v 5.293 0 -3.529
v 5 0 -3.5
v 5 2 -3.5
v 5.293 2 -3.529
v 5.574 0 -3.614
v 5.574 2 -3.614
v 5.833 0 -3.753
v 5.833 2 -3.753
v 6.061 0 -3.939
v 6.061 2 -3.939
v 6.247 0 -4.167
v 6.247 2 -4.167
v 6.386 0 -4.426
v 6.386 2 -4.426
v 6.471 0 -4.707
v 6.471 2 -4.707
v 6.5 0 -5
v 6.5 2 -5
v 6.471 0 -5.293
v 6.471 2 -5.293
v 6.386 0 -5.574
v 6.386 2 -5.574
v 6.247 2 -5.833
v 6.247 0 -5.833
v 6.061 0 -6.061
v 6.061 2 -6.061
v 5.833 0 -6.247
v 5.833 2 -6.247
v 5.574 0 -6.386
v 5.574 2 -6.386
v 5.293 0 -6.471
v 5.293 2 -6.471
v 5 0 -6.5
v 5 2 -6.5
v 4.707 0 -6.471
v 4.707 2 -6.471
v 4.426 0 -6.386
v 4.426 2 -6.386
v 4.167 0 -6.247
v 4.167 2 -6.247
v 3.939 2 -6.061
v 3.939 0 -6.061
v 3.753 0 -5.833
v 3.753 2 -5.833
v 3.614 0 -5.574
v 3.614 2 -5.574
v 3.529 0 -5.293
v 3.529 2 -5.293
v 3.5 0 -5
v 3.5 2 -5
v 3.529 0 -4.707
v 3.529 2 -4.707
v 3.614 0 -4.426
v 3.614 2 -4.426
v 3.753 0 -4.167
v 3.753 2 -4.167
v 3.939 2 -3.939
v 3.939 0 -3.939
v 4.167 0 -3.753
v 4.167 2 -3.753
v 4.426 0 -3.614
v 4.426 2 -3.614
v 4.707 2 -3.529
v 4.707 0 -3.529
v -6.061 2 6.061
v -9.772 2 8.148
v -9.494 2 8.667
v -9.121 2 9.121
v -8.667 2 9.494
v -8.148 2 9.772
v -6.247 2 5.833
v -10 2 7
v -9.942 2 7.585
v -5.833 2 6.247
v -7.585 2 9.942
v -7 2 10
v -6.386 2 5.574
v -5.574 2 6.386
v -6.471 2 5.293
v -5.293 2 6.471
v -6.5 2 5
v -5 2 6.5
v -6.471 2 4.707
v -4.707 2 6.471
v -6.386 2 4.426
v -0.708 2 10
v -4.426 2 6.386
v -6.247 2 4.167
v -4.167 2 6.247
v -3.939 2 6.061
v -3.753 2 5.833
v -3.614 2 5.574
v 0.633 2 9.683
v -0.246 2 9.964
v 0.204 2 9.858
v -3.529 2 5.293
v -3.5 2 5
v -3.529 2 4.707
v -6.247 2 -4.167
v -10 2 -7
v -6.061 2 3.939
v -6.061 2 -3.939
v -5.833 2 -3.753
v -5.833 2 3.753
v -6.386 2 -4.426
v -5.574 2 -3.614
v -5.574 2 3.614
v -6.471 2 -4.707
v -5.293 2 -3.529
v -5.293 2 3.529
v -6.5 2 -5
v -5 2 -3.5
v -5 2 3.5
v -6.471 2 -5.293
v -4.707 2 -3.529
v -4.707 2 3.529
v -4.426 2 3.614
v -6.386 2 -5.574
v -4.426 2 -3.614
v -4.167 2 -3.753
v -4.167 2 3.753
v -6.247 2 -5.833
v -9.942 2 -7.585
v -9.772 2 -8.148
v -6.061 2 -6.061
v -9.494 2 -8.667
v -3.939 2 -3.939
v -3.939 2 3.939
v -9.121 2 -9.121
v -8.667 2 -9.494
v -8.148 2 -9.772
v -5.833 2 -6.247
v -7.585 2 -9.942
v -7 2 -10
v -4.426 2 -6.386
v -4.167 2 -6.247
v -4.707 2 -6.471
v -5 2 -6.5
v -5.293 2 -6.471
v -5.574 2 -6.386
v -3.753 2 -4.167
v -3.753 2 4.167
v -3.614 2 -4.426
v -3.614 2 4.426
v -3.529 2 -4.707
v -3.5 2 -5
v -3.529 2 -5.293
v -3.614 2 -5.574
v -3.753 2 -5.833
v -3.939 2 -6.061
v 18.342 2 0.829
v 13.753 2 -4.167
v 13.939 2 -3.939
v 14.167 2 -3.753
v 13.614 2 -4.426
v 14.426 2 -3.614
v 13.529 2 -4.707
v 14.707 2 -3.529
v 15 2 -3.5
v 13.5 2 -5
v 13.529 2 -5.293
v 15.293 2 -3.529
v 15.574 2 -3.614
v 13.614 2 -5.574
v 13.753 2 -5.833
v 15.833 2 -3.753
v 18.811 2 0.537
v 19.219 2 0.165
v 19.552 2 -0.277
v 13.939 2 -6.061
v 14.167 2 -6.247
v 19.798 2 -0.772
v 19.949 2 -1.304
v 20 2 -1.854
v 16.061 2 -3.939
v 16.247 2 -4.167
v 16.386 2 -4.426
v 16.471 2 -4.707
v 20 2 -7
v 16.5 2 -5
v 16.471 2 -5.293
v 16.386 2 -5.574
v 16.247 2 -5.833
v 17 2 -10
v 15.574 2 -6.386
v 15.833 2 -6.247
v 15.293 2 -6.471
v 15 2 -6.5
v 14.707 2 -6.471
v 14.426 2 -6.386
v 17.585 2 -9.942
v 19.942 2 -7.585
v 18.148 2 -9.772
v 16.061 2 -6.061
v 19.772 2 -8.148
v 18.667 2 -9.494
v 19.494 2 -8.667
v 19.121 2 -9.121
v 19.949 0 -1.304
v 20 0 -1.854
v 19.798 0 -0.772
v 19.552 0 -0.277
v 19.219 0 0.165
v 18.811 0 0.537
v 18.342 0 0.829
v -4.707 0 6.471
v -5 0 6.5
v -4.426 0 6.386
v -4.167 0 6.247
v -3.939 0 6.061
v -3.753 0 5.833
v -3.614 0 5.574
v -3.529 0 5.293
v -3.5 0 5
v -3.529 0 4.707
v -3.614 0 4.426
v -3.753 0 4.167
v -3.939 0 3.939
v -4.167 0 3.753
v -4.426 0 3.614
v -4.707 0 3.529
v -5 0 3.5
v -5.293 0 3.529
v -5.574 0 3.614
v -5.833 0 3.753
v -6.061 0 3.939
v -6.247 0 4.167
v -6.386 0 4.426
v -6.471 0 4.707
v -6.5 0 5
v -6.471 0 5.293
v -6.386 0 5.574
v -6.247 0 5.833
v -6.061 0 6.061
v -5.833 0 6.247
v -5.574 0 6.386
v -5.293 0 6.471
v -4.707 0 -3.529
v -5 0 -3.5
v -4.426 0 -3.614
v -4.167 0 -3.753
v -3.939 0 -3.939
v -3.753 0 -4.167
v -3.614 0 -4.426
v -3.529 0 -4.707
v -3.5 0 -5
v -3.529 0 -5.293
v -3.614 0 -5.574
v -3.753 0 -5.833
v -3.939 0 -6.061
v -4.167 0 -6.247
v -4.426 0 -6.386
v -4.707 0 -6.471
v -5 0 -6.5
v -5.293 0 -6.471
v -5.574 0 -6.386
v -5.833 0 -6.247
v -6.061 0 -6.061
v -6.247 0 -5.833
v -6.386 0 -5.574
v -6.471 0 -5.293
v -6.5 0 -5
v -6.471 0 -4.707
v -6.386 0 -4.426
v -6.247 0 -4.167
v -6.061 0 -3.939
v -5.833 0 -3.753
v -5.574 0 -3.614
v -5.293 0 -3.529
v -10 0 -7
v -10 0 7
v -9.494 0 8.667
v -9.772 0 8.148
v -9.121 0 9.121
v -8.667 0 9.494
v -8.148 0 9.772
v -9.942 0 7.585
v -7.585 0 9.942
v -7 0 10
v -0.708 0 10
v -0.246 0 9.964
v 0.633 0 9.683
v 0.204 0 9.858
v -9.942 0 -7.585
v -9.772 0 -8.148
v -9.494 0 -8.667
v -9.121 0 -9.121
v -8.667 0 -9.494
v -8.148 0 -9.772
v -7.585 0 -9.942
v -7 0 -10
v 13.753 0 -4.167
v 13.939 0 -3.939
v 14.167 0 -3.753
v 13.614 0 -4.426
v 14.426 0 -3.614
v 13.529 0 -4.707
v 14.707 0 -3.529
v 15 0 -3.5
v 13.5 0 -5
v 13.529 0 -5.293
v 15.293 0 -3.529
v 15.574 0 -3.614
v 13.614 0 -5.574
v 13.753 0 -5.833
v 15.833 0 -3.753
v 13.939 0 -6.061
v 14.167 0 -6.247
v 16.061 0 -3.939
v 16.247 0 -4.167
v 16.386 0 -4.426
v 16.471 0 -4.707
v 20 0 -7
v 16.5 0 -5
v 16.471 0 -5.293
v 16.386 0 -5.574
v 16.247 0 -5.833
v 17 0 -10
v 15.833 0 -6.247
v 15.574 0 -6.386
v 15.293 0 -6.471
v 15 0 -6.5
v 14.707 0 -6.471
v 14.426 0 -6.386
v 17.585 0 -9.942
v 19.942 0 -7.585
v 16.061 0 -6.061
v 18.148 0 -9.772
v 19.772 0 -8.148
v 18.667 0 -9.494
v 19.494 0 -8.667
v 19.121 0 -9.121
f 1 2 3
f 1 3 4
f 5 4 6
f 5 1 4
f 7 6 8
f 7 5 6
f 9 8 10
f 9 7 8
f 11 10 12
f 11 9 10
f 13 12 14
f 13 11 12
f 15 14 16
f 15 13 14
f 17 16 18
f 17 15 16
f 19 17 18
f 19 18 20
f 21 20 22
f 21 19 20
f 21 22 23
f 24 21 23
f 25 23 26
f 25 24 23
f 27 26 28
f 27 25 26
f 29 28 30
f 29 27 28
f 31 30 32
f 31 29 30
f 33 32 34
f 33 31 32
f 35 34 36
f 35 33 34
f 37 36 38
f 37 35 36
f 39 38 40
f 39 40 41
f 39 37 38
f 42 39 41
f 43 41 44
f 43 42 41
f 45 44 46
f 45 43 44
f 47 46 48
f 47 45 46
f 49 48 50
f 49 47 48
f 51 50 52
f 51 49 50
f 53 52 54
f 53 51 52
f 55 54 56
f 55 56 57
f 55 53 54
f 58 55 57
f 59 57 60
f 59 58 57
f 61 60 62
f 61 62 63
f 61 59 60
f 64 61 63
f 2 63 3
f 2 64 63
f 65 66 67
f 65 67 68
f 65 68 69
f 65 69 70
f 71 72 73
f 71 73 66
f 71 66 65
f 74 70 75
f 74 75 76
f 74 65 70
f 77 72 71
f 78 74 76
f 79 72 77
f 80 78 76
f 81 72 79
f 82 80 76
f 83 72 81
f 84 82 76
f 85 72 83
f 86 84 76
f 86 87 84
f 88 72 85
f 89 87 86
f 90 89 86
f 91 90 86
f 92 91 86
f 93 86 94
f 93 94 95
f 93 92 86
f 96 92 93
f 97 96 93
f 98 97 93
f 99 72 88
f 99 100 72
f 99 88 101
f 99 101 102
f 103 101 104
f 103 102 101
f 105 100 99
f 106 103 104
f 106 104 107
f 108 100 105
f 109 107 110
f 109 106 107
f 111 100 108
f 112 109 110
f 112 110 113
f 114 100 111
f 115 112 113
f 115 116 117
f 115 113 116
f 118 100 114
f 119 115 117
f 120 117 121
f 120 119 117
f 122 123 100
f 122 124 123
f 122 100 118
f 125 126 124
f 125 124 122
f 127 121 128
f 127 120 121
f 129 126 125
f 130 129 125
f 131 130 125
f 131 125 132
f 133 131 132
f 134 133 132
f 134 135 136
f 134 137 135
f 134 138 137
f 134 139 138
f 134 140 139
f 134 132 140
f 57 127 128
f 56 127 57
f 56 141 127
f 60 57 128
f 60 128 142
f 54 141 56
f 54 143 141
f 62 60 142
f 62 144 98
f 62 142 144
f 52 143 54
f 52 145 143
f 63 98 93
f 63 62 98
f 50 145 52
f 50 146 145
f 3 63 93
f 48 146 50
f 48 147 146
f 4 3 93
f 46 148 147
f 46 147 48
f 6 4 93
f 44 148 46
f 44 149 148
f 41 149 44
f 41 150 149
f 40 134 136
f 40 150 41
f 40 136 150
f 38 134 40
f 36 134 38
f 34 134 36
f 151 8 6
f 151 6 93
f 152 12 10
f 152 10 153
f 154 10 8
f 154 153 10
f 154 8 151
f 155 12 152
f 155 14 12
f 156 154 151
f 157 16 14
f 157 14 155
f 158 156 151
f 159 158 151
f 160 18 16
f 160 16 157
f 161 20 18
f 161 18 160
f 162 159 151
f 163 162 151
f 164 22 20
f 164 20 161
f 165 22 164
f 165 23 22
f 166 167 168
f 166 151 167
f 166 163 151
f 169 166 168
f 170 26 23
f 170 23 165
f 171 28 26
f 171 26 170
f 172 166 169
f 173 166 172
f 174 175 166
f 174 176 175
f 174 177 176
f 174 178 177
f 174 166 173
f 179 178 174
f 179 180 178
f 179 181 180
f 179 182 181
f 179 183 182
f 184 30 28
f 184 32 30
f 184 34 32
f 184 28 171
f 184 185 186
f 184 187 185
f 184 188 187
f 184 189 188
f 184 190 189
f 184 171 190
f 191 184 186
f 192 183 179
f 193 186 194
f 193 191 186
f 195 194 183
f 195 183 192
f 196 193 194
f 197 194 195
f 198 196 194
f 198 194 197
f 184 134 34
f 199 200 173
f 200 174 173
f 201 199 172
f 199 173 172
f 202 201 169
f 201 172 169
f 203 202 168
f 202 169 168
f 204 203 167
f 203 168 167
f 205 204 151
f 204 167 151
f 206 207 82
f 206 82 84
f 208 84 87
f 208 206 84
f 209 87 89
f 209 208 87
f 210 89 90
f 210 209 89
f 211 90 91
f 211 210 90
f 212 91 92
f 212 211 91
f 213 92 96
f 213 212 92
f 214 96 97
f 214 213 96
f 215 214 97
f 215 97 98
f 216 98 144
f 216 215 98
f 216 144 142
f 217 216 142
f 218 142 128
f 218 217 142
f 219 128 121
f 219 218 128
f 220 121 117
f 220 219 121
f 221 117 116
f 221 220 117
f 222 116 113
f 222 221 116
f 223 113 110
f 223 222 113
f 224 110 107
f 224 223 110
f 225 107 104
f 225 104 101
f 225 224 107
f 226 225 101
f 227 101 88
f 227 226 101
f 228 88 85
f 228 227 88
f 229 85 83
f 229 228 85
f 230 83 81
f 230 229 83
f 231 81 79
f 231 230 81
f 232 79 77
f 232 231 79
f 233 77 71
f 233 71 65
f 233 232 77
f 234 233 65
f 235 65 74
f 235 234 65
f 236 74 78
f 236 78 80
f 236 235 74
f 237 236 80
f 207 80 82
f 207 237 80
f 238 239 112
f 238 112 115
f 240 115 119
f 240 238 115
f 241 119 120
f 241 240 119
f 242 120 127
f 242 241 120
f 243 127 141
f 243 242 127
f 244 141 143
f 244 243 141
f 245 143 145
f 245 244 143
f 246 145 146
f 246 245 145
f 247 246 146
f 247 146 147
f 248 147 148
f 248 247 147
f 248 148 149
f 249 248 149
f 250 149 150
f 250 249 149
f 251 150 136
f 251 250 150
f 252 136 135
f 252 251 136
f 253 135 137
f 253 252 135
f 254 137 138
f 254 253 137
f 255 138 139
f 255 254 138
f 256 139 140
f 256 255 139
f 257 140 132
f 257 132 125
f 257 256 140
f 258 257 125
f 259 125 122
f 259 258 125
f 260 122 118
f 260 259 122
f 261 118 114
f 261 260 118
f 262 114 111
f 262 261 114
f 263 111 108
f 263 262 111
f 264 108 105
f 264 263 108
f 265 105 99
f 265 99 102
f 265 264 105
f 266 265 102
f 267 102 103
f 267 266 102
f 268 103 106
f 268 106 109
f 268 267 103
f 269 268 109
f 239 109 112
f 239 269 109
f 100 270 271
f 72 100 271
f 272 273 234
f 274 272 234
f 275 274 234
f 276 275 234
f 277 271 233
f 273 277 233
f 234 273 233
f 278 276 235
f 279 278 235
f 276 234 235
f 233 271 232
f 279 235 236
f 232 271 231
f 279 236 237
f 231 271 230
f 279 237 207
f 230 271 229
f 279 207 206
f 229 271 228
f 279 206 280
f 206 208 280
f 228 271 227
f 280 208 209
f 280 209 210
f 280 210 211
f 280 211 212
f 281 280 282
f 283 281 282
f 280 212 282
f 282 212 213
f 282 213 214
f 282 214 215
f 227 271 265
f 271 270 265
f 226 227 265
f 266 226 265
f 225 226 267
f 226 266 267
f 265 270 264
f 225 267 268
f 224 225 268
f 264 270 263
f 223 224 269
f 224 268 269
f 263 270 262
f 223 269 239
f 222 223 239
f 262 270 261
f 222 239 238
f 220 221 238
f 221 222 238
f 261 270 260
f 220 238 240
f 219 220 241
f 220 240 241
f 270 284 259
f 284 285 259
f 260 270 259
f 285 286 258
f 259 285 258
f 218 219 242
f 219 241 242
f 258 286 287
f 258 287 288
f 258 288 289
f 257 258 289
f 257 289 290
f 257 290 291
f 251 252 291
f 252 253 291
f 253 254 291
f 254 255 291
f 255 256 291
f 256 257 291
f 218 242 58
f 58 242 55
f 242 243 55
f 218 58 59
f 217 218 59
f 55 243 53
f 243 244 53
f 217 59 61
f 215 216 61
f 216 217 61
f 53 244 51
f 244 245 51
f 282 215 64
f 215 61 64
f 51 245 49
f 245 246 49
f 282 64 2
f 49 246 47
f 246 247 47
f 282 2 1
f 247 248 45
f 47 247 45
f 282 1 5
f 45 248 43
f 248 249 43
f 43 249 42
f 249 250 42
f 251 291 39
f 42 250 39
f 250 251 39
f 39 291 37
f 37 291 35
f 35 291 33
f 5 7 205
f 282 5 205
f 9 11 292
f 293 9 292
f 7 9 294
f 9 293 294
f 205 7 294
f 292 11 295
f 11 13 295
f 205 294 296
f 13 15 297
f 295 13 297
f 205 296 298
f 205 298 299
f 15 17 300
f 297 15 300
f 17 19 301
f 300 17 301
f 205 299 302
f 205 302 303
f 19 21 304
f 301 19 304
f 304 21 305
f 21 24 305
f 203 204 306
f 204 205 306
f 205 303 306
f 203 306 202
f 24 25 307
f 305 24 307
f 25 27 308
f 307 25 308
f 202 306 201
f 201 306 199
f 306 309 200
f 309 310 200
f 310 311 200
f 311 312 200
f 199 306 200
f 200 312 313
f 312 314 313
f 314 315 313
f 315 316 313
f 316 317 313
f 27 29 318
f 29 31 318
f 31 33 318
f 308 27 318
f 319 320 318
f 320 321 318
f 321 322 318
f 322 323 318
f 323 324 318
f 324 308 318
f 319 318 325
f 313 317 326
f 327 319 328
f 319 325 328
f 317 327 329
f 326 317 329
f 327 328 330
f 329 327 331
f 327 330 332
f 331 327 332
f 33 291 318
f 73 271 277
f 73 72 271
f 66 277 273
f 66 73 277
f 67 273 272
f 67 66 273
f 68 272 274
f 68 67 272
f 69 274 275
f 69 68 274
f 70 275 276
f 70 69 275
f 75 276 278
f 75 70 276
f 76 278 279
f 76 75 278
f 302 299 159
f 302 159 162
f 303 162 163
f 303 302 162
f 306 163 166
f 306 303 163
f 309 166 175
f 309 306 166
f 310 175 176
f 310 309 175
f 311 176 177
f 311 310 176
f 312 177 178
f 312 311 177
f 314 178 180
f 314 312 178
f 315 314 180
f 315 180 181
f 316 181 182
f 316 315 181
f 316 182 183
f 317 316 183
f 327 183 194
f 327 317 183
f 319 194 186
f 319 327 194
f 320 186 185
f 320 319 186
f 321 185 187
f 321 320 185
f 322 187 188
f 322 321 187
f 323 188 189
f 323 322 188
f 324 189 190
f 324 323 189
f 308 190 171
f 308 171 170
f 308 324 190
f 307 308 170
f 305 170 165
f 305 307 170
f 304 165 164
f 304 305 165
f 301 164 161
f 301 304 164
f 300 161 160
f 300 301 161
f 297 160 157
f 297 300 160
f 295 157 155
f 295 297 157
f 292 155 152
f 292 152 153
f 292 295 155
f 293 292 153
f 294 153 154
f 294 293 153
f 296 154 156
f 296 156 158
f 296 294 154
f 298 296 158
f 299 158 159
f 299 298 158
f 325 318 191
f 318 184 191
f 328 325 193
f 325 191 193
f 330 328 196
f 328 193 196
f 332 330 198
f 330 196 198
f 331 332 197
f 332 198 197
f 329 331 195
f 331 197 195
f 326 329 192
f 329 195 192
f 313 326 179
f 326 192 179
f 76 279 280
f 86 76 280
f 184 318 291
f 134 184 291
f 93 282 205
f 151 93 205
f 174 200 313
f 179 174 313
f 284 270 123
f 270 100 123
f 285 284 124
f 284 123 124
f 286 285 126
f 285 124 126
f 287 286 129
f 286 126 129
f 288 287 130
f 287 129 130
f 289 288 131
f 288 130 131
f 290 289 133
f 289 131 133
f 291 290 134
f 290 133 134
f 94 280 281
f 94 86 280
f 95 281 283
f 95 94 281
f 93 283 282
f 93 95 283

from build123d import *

# Parameters (mm, degrees)
SKETCH_1_R      = 1.5
EXTRUDE_1_DEPTH = 2
FILLET_1_R      = 3


with BuildPart() as part:
    # 草图1 → 凸台-拉伸1 (new body)
    with BuildSketch(Plane(origin=(0, 0, 0), x_dir=(1, 0, 0), z_dir=(0, 1, 0))):
        Polygon((0, 10), (-10, 10), (-10, 0), (-10, -10), (0, -10), (20, 0), (20, 10), align=None)
        with Locations(Location((5, 5, 0), (0, 0, 270))):
            Circle(SKETCH_1_R, mode=Mode.SUBTRACT)
        with Locations(Location((15, 5, 0), (0, 0, 270))):
            Circle(SKETCH_1_R, mode=Mode.SUBTRACT)
        with Locations(Location((-5, 5, 0), (0, 0, 270))):
            Circle(SKETCH_1_R, mode=Mode.SUBTRACT)
        with Locations(Location((-5, -5, 0), (0, 0, 270))):
            Circle(SKETCH_1_R, mode=Mode.SUBTRACT)
    extrude(amount=EXTRUDE_1_DEPTH)

    # 圆角1
    fillet_1_edges = [part.edges().sort_by_distance(p)[0] for p in [
        (20, 1, 0),
        (0, 1, 10),
        (-10, 1, 10),
        (-10, 1, -10),
        (20, 1, -10),
    ]]
    fillet(fillet_1_edges, radius=FILLET_1_R)


solid = part.part
